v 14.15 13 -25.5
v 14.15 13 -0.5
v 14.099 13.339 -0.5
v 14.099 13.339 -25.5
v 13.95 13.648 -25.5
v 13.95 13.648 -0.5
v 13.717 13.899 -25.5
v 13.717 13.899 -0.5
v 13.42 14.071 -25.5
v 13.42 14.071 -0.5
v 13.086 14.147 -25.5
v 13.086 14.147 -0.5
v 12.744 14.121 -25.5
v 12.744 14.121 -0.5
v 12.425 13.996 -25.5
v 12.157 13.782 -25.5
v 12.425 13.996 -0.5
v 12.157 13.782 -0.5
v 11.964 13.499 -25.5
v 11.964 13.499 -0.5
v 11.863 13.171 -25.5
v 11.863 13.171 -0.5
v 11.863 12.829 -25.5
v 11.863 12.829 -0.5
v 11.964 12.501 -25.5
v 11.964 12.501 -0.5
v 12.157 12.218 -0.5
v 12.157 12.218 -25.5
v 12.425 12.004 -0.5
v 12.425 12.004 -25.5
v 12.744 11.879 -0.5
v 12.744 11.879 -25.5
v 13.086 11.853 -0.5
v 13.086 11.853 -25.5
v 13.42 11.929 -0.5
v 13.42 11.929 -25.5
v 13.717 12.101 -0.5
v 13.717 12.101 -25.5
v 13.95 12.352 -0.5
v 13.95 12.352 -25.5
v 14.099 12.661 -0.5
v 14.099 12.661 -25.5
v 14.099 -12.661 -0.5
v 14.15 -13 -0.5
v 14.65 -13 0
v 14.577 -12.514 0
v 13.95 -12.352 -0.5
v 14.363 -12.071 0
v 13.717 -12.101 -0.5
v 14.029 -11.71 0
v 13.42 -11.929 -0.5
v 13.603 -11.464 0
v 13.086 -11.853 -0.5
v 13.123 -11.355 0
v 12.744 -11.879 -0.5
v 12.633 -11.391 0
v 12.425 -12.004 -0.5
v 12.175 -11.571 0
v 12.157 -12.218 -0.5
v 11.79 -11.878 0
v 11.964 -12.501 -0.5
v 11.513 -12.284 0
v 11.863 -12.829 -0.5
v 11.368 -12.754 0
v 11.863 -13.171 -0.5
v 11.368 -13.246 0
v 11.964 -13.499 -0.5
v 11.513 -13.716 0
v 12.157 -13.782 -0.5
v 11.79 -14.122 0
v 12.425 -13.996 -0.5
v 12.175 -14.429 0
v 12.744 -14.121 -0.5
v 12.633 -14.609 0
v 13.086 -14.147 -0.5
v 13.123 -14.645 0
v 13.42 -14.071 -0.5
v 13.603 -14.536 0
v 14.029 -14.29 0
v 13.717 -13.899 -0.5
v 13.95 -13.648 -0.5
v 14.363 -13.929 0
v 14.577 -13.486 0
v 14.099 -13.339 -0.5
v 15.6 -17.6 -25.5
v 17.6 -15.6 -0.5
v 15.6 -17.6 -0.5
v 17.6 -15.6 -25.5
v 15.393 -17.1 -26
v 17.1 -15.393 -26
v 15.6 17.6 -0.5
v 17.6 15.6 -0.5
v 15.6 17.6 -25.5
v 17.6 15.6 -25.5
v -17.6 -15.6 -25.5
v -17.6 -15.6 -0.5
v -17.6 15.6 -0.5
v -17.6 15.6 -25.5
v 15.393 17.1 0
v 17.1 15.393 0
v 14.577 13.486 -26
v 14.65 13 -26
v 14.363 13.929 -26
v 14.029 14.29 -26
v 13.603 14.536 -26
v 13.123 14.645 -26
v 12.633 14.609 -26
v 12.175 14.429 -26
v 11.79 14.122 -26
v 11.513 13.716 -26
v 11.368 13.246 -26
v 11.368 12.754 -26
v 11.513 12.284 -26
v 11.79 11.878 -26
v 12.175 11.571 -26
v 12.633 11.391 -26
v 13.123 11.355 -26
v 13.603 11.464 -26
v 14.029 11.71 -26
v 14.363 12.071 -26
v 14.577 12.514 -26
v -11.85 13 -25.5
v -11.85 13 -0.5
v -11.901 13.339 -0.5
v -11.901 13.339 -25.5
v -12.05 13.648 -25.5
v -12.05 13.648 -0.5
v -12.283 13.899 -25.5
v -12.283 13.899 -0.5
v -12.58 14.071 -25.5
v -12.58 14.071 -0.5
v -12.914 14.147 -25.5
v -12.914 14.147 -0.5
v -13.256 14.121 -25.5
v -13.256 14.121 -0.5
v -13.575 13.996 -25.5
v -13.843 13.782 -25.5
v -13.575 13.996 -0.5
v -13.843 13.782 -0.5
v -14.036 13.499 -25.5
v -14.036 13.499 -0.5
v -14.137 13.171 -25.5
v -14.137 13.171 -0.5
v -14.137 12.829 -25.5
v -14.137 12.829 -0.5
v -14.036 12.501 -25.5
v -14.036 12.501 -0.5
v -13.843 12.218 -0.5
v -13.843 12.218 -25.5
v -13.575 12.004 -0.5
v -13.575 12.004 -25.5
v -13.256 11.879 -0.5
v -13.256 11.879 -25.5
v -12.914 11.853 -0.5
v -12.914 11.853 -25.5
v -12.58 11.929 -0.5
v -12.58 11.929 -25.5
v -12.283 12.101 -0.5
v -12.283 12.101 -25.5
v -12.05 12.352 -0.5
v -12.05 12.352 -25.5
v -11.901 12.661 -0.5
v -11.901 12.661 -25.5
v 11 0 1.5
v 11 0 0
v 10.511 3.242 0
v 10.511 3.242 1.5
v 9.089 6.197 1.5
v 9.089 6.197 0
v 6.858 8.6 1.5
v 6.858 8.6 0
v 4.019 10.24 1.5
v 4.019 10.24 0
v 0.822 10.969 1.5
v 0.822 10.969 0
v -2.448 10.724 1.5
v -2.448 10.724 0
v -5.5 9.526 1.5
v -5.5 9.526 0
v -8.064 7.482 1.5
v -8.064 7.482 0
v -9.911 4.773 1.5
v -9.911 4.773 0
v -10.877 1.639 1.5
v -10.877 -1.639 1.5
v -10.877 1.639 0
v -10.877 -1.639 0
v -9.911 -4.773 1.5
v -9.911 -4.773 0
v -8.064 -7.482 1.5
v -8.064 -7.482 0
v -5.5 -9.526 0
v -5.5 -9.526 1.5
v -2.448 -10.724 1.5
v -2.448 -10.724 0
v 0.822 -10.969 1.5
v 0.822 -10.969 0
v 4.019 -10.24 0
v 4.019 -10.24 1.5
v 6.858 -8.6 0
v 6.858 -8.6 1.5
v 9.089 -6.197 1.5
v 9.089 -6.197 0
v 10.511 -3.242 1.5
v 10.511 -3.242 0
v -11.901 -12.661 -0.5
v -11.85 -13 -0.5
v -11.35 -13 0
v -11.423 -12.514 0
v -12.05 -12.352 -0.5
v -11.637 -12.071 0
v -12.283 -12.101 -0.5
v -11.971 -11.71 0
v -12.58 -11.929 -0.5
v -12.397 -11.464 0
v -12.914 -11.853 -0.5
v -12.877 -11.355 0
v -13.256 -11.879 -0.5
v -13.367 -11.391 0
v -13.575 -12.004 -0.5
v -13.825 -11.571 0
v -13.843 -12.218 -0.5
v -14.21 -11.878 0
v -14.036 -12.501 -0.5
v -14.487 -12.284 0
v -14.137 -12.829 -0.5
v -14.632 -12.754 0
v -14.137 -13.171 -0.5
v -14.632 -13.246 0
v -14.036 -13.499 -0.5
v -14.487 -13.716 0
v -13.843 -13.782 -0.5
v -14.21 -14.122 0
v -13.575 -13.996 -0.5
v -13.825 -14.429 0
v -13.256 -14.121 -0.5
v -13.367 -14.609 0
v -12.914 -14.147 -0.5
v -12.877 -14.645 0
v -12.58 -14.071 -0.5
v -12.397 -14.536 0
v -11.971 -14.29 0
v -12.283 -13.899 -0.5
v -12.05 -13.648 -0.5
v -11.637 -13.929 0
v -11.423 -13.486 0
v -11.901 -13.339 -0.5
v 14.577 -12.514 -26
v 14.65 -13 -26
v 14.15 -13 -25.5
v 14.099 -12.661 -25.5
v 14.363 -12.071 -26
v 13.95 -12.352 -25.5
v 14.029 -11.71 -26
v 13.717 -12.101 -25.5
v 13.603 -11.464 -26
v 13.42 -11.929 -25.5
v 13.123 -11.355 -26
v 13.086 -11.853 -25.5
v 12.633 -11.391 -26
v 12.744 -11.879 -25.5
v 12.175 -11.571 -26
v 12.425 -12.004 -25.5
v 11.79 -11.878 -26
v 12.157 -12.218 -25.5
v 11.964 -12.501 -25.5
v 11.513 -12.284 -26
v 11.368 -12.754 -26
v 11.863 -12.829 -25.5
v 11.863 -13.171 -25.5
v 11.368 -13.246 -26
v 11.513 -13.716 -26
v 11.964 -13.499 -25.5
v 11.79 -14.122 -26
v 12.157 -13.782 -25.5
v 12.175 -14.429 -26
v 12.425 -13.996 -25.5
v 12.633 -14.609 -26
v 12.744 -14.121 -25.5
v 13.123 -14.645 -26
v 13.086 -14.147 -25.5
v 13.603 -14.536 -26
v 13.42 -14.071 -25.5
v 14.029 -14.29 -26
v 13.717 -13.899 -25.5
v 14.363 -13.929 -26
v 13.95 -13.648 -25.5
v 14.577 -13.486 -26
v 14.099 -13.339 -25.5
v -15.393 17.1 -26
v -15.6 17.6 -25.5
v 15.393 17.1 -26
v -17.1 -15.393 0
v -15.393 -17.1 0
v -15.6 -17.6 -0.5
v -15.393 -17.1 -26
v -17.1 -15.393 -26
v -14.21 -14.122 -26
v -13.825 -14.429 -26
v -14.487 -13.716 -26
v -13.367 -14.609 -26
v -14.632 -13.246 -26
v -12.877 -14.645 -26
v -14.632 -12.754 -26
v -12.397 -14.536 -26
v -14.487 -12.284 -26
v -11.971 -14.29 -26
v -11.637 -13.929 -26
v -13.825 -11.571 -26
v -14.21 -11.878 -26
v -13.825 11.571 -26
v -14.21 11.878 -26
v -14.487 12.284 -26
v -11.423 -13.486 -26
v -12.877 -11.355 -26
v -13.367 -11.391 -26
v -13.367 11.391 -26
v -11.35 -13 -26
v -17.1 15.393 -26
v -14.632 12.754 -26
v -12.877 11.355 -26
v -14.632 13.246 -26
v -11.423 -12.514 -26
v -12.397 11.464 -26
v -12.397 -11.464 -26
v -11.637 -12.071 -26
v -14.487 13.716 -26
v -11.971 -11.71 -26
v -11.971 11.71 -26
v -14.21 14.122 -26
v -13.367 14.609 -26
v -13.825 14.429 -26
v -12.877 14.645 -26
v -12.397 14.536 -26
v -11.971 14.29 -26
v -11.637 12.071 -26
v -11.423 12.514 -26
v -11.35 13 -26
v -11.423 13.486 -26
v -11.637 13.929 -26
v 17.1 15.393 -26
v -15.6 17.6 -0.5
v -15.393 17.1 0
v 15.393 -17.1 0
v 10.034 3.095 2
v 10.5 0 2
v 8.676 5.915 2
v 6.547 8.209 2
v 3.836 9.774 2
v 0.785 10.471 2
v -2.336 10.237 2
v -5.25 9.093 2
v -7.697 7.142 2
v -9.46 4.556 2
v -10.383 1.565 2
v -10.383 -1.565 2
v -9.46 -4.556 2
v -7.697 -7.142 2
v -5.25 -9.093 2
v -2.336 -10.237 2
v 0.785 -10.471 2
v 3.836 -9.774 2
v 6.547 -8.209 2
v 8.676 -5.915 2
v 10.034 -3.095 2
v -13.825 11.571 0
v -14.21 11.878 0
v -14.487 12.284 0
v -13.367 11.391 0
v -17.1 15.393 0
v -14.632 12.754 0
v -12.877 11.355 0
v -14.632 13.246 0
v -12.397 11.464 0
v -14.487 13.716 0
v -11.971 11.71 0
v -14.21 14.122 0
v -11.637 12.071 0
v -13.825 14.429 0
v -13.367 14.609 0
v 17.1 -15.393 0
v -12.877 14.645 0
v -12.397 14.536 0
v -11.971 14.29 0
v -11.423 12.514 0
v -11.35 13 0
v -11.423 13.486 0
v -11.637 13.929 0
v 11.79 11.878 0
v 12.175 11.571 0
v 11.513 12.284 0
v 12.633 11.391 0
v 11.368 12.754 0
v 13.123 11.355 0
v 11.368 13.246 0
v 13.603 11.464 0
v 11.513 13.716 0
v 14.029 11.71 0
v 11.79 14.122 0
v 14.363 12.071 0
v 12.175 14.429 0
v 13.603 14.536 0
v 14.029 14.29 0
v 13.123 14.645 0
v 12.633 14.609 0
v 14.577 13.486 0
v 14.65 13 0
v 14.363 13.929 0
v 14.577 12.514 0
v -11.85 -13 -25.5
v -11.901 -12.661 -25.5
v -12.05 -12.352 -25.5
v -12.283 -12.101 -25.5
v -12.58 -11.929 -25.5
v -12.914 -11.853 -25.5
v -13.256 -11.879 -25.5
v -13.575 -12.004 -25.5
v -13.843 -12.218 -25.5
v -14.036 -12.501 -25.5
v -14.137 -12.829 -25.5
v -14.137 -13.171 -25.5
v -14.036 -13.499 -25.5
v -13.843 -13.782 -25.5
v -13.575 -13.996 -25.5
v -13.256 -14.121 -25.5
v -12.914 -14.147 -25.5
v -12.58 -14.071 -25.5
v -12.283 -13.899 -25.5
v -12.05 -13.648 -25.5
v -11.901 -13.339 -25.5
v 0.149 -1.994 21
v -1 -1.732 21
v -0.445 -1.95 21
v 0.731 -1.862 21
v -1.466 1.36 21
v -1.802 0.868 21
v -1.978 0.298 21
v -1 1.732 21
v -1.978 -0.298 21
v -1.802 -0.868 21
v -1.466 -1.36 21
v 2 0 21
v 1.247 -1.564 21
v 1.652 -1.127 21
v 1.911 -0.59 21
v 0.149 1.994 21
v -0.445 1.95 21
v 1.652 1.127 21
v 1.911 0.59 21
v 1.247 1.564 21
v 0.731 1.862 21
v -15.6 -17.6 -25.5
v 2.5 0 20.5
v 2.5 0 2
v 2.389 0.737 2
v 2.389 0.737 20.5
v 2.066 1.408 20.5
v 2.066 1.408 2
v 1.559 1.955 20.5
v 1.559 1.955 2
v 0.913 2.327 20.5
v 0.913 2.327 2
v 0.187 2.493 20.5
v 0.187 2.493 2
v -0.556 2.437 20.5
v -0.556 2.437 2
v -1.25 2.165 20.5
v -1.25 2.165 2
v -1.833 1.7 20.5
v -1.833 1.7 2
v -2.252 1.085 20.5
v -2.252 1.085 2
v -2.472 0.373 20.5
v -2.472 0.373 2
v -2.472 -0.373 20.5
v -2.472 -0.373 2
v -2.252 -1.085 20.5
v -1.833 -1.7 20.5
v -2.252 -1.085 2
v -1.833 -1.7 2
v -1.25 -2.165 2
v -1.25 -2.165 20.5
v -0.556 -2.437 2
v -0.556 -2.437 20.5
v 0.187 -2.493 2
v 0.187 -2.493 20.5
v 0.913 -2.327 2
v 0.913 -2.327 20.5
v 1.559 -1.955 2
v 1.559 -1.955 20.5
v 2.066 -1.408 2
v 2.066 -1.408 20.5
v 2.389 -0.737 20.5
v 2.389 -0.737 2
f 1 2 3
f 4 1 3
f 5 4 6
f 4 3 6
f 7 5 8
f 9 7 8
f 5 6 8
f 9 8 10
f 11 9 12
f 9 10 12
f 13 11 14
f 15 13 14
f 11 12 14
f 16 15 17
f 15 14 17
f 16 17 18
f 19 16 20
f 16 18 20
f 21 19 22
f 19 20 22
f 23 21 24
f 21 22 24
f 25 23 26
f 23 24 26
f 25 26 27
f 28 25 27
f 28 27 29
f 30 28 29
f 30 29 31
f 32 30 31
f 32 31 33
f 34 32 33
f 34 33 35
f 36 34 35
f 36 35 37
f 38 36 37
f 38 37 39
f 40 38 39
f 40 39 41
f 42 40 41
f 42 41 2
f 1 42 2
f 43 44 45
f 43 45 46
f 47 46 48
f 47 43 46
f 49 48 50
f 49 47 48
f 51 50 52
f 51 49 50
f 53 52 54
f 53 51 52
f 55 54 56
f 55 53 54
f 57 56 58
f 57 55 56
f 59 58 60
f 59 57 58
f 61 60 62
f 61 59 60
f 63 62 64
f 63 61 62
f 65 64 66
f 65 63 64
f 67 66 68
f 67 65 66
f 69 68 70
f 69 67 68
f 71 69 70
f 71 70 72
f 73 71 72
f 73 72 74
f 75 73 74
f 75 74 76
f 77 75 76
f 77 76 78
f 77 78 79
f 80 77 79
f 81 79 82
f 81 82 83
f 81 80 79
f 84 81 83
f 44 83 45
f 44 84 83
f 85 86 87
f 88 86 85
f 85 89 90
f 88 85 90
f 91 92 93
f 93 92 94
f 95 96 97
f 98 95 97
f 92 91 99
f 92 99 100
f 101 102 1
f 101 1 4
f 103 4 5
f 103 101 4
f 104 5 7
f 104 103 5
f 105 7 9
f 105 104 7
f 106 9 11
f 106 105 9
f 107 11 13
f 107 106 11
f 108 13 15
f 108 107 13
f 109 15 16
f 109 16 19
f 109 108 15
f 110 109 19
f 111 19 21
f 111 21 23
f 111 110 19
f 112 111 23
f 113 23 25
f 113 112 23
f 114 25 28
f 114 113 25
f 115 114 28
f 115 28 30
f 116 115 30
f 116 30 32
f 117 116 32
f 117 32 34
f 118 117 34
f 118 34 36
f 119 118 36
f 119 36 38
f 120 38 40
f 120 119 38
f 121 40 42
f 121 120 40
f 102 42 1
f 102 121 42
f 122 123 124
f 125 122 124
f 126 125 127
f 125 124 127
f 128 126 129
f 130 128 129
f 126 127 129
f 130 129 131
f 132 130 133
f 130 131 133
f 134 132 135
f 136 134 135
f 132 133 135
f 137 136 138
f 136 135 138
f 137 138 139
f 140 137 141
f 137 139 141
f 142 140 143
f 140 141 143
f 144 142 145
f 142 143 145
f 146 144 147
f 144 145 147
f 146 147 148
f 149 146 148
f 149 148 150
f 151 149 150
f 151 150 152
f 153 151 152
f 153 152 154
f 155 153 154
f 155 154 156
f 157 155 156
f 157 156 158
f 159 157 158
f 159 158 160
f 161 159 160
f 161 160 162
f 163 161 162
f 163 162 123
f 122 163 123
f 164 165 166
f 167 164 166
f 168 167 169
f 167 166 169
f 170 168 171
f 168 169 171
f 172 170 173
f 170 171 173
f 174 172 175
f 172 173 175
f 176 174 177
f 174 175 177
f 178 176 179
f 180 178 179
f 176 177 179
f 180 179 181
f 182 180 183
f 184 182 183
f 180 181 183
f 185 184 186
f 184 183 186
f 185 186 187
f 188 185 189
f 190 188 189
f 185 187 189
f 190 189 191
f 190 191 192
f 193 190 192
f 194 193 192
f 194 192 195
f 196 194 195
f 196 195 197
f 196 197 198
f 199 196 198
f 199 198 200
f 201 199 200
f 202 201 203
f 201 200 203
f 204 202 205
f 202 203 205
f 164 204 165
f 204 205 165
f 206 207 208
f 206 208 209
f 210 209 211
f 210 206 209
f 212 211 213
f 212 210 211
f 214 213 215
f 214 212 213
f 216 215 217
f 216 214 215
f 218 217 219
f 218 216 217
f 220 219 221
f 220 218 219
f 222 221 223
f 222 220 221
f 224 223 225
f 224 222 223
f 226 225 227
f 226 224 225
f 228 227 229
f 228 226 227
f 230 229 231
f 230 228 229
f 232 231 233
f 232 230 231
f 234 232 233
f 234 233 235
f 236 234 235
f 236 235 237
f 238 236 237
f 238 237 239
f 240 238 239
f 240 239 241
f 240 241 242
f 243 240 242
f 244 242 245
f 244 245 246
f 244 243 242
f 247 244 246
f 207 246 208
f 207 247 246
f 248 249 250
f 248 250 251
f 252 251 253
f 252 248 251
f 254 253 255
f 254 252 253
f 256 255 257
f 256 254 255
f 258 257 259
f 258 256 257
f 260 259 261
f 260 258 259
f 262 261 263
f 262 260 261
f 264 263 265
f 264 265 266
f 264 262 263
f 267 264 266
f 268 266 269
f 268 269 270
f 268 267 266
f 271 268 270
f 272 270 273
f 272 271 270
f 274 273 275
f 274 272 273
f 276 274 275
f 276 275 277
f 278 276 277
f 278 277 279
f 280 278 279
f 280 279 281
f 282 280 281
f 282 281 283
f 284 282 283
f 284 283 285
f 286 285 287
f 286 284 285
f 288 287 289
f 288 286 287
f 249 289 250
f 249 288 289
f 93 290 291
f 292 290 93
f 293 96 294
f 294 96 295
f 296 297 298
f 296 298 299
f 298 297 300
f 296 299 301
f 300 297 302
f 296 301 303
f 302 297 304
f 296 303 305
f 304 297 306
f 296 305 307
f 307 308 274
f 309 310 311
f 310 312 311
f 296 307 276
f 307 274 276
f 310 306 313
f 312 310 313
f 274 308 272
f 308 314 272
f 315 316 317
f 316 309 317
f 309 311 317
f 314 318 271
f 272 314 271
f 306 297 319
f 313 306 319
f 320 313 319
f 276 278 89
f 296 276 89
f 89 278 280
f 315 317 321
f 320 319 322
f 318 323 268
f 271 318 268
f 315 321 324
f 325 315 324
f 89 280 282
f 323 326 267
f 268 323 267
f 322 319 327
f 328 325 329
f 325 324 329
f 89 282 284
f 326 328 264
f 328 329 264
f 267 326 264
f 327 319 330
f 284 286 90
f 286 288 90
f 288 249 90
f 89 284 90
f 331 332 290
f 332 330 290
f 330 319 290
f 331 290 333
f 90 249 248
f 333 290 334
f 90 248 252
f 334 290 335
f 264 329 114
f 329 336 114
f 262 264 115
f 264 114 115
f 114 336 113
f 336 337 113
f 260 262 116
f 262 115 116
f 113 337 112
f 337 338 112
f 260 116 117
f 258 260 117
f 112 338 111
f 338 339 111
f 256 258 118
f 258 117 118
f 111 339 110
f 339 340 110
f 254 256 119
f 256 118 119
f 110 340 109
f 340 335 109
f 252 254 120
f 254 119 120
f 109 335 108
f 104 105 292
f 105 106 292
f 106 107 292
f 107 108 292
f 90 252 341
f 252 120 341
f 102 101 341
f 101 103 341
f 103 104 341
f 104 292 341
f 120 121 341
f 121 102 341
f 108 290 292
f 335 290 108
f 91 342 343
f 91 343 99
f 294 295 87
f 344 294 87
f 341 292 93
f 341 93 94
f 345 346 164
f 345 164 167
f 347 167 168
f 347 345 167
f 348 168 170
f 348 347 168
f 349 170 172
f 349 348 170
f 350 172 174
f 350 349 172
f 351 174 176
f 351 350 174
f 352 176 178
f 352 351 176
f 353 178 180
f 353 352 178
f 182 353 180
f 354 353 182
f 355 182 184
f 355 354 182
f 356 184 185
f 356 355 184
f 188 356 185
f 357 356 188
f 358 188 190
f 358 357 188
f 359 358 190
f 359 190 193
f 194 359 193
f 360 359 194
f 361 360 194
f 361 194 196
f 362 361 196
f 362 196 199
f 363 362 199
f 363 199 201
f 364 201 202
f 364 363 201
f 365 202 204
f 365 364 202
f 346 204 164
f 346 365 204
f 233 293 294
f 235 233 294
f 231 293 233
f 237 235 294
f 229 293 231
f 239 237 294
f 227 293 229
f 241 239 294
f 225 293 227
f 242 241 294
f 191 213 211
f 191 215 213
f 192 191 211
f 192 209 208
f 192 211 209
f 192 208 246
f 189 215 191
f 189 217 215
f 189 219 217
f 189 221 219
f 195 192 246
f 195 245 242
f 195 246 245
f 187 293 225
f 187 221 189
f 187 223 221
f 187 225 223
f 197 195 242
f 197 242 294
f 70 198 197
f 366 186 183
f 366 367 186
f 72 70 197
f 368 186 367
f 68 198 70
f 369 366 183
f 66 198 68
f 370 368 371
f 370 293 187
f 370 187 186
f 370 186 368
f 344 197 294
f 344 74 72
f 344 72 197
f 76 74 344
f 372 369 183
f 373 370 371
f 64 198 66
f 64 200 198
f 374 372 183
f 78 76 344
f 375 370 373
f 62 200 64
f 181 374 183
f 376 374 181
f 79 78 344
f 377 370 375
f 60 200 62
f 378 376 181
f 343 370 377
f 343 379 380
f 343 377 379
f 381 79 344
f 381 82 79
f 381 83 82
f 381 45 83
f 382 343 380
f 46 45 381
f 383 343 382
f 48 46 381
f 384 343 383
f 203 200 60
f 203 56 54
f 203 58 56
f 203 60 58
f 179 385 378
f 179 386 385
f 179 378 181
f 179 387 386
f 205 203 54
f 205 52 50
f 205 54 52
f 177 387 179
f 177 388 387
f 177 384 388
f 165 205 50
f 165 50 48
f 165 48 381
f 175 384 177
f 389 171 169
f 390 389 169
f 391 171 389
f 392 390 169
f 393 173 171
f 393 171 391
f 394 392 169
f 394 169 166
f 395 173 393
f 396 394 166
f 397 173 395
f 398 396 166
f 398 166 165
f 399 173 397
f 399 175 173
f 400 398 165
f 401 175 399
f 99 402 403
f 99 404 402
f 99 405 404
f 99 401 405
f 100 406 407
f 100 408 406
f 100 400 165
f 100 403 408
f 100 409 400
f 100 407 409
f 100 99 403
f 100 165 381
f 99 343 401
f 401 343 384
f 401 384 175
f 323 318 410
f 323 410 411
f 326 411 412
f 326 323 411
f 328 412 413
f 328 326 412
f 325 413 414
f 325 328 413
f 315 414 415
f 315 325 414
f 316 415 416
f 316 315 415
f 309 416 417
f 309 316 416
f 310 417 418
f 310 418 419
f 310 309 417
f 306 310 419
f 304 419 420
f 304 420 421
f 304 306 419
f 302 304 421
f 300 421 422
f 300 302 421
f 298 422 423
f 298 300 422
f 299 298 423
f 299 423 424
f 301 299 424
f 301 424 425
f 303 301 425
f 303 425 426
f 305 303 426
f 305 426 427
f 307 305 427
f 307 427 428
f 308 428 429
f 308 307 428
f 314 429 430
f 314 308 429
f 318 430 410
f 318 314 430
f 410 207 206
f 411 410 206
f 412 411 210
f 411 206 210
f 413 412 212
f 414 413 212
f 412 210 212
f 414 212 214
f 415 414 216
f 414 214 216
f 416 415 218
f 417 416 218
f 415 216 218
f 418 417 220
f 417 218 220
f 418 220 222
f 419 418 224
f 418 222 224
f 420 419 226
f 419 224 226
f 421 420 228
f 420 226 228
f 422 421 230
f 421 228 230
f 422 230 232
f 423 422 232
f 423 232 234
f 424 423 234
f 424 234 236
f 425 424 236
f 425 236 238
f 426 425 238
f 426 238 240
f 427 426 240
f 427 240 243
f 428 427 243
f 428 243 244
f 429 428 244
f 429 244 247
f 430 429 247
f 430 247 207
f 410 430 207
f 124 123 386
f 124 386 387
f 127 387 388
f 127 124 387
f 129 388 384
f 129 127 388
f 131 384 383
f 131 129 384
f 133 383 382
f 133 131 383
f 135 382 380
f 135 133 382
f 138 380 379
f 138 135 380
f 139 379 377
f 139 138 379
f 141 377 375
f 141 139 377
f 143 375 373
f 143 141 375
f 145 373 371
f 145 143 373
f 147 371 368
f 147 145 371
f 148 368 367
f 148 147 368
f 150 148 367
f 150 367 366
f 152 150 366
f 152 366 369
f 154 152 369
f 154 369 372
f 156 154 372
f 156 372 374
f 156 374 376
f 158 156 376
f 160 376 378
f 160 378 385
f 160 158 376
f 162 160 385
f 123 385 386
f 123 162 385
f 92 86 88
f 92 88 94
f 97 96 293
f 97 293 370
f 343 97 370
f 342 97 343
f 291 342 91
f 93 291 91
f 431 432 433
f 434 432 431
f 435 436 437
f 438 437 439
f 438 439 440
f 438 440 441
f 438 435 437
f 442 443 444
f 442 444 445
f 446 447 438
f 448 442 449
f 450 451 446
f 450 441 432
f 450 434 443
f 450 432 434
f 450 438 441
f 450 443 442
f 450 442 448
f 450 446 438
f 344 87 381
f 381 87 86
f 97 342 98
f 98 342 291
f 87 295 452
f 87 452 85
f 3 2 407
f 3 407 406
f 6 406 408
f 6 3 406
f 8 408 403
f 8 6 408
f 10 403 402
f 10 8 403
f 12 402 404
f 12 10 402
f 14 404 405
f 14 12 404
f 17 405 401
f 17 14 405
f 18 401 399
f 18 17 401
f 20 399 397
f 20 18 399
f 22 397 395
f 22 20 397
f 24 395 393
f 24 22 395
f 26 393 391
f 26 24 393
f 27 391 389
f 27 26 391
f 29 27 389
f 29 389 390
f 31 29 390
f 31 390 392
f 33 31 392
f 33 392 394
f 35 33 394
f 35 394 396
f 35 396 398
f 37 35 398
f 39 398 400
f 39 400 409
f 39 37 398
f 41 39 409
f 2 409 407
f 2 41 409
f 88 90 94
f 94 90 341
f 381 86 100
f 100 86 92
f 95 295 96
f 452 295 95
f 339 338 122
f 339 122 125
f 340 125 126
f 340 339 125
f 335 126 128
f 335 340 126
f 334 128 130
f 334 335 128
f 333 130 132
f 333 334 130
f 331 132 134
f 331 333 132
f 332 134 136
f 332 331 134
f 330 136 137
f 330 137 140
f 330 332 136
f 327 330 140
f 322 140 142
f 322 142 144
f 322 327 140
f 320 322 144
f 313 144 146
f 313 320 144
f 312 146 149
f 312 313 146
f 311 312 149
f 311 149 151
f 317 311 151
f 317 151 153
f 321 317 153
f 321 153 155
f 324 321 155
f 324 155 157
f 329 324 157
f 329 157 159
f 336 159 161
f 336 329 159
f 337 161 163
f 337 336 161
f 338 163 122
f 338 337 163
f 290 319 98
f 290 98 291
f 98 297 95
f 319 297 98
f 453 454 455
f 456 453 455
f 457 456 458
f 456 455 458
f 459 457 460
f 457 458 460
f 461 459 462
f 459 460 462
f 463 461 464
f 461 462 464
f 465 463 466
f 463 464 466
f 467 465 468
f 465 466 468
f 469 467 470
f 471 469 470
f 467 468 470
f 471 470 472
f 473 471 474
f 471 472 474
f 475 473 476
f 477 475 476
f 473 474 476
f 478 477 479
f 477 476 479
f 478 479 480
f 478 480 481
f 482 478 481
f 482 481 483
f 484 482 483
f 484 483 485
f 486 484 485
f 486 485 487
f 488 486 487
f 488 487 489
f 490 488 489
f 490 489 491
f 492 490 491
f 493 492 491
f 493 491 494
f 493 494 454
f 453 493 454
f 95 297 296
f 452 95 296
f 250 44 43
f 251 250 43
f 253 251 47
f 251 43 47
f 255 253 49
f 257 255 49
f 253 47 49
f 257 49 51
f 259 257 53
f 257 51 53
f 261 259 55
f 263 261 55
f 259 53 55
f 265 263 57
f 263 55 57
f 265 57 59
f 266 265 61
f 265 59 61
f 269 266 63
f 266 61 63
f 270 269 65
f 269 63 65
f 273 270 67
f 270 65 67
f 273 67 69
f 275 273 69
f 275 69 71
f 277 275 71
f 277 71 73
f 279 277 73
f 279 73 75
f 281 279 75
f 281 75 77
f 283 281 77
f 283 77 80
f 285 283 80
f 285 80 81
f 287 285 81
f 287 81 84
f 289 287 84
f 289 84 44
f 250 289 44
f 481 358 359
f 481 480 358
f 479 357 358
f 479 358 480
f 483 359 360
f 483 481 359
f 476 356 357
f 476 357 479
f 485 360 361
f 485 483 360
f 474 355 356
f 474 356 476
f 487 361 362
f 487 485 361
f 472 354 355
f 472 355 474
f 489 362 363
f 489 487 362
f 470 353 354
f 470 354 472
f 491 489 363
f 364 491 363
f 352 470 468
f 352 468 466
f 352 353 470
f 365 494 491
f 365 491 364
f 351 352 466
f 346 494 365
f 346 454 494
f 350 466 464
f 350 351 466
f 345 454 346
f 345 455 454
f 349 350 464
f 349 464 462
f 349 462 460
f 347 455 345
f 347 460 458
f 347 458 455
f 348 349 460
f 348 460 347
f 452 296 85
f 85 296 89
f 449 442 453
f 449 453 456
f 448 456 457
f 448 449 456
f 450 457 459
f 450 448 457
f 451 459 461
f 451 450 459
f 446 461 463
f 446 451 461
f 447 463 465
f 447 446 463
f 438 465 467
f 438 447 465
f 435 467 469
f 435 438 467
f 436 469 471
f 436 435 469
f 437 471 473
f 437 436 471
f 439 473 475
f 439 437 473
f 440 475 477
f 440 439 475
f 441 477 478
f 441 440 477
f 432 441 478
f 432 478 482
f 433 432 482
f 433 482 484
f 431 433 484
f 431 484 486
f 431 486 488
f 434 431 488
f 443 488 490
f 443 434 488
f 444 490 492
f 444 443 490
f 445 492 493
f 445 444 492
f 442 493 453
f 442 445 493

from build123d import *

# Parameters (mm, degrees)
F0_W     = 35.2
F0_H     = 35.2
F4_DEPTH = 26
F1_R     = 11
F5_DEPTH = 2
F2_R     = 2.5
F6_DEPTH = 21
F3_R     = 1.15
F7_DEPTH = 26.001
F8_SIZE  = 2
F9_SIZE  = 0.5


with BuildPart() as f4:
    # F0 (on Top) → F4 (new body)
    with BuildSketch(Plane.XY):
        Rectangle(F0_W, F0_H)
    extrude(amount=-F4_DEPTH)

    # F1 (on Top) → F5 (join)
    with BuildSketch(Plane.XY):
        Circle(F1_R)
    extrude(amount=F5_DEPTH)

    # F2 (on Top) → F6 (join)
    with BuildSketch(Plane.XY):
        Circle(F2_R)
    extrude(amount=F6_DEPTH)

    # F3 (on Top) → F7 (cut, through all)
    with BuildSketch(Plane.XY):
        with Locations((-13, -13)):
            Circle(F3_R)
        with Locations((13, -13)):
            Circle(F3_R)
        with Locations((13, 13)):
            Circle(F3_R)
        with Locations((-13, 13)):
            Circle(F3_R)
    extrude(amount=-F7_DEPTH, mode=Mode.SUBTRACT)

    # F8
    f8_edges = [f4.edges().sort_by_distance(p)[0] for p in [
        (17.6, -17.6, -13),
        (-17.6, -17.6, -13),
        (-17.6, 17.6, -13),
        (17.6, 17.6, -13),
    ]]
    chamfer(f8_edges, length=F8_SIZE)

    # F9
    f9_edges = [f4.edges().sort_by_distance(p)[0] for p in [
        (-2.5, 0, 21),
        (-11, 0, 2),
        (11.85, 13, 0),
        (11.85, -13, 0),
        (-14.15, -13, 0),
        (-14.15, 13, 0),
        (0, 17.6, 0),
        (16.6, 16.6, 0),
        (17.6, 0, 0),
        (16.6, -16.6, 0),
        (0, -17.6, 0),
        (-17.6, 0, 0),
        (17.6, 0, -26),
        (0, -17.6, -26),
        (11.85, -13, -26),
        (16.6, -16.6, -26),
        (-14.15, -13, -26),
        (11.85, 13, -26),
        (-14.15, 13, -26),
        (0, 17.6, -26),
        (-16.6, 16.6, -26),
        (16.6, 16.6, -26),
        (-17.6, 0, -26),
        (-16.6, -16.6, -26),
        (-16.6, 16.6, 0),
        (-16.6, -16.6, 0),
    ]]
    chamfer(f9_edges, length=F9_SIZE)


solid = f4.part
